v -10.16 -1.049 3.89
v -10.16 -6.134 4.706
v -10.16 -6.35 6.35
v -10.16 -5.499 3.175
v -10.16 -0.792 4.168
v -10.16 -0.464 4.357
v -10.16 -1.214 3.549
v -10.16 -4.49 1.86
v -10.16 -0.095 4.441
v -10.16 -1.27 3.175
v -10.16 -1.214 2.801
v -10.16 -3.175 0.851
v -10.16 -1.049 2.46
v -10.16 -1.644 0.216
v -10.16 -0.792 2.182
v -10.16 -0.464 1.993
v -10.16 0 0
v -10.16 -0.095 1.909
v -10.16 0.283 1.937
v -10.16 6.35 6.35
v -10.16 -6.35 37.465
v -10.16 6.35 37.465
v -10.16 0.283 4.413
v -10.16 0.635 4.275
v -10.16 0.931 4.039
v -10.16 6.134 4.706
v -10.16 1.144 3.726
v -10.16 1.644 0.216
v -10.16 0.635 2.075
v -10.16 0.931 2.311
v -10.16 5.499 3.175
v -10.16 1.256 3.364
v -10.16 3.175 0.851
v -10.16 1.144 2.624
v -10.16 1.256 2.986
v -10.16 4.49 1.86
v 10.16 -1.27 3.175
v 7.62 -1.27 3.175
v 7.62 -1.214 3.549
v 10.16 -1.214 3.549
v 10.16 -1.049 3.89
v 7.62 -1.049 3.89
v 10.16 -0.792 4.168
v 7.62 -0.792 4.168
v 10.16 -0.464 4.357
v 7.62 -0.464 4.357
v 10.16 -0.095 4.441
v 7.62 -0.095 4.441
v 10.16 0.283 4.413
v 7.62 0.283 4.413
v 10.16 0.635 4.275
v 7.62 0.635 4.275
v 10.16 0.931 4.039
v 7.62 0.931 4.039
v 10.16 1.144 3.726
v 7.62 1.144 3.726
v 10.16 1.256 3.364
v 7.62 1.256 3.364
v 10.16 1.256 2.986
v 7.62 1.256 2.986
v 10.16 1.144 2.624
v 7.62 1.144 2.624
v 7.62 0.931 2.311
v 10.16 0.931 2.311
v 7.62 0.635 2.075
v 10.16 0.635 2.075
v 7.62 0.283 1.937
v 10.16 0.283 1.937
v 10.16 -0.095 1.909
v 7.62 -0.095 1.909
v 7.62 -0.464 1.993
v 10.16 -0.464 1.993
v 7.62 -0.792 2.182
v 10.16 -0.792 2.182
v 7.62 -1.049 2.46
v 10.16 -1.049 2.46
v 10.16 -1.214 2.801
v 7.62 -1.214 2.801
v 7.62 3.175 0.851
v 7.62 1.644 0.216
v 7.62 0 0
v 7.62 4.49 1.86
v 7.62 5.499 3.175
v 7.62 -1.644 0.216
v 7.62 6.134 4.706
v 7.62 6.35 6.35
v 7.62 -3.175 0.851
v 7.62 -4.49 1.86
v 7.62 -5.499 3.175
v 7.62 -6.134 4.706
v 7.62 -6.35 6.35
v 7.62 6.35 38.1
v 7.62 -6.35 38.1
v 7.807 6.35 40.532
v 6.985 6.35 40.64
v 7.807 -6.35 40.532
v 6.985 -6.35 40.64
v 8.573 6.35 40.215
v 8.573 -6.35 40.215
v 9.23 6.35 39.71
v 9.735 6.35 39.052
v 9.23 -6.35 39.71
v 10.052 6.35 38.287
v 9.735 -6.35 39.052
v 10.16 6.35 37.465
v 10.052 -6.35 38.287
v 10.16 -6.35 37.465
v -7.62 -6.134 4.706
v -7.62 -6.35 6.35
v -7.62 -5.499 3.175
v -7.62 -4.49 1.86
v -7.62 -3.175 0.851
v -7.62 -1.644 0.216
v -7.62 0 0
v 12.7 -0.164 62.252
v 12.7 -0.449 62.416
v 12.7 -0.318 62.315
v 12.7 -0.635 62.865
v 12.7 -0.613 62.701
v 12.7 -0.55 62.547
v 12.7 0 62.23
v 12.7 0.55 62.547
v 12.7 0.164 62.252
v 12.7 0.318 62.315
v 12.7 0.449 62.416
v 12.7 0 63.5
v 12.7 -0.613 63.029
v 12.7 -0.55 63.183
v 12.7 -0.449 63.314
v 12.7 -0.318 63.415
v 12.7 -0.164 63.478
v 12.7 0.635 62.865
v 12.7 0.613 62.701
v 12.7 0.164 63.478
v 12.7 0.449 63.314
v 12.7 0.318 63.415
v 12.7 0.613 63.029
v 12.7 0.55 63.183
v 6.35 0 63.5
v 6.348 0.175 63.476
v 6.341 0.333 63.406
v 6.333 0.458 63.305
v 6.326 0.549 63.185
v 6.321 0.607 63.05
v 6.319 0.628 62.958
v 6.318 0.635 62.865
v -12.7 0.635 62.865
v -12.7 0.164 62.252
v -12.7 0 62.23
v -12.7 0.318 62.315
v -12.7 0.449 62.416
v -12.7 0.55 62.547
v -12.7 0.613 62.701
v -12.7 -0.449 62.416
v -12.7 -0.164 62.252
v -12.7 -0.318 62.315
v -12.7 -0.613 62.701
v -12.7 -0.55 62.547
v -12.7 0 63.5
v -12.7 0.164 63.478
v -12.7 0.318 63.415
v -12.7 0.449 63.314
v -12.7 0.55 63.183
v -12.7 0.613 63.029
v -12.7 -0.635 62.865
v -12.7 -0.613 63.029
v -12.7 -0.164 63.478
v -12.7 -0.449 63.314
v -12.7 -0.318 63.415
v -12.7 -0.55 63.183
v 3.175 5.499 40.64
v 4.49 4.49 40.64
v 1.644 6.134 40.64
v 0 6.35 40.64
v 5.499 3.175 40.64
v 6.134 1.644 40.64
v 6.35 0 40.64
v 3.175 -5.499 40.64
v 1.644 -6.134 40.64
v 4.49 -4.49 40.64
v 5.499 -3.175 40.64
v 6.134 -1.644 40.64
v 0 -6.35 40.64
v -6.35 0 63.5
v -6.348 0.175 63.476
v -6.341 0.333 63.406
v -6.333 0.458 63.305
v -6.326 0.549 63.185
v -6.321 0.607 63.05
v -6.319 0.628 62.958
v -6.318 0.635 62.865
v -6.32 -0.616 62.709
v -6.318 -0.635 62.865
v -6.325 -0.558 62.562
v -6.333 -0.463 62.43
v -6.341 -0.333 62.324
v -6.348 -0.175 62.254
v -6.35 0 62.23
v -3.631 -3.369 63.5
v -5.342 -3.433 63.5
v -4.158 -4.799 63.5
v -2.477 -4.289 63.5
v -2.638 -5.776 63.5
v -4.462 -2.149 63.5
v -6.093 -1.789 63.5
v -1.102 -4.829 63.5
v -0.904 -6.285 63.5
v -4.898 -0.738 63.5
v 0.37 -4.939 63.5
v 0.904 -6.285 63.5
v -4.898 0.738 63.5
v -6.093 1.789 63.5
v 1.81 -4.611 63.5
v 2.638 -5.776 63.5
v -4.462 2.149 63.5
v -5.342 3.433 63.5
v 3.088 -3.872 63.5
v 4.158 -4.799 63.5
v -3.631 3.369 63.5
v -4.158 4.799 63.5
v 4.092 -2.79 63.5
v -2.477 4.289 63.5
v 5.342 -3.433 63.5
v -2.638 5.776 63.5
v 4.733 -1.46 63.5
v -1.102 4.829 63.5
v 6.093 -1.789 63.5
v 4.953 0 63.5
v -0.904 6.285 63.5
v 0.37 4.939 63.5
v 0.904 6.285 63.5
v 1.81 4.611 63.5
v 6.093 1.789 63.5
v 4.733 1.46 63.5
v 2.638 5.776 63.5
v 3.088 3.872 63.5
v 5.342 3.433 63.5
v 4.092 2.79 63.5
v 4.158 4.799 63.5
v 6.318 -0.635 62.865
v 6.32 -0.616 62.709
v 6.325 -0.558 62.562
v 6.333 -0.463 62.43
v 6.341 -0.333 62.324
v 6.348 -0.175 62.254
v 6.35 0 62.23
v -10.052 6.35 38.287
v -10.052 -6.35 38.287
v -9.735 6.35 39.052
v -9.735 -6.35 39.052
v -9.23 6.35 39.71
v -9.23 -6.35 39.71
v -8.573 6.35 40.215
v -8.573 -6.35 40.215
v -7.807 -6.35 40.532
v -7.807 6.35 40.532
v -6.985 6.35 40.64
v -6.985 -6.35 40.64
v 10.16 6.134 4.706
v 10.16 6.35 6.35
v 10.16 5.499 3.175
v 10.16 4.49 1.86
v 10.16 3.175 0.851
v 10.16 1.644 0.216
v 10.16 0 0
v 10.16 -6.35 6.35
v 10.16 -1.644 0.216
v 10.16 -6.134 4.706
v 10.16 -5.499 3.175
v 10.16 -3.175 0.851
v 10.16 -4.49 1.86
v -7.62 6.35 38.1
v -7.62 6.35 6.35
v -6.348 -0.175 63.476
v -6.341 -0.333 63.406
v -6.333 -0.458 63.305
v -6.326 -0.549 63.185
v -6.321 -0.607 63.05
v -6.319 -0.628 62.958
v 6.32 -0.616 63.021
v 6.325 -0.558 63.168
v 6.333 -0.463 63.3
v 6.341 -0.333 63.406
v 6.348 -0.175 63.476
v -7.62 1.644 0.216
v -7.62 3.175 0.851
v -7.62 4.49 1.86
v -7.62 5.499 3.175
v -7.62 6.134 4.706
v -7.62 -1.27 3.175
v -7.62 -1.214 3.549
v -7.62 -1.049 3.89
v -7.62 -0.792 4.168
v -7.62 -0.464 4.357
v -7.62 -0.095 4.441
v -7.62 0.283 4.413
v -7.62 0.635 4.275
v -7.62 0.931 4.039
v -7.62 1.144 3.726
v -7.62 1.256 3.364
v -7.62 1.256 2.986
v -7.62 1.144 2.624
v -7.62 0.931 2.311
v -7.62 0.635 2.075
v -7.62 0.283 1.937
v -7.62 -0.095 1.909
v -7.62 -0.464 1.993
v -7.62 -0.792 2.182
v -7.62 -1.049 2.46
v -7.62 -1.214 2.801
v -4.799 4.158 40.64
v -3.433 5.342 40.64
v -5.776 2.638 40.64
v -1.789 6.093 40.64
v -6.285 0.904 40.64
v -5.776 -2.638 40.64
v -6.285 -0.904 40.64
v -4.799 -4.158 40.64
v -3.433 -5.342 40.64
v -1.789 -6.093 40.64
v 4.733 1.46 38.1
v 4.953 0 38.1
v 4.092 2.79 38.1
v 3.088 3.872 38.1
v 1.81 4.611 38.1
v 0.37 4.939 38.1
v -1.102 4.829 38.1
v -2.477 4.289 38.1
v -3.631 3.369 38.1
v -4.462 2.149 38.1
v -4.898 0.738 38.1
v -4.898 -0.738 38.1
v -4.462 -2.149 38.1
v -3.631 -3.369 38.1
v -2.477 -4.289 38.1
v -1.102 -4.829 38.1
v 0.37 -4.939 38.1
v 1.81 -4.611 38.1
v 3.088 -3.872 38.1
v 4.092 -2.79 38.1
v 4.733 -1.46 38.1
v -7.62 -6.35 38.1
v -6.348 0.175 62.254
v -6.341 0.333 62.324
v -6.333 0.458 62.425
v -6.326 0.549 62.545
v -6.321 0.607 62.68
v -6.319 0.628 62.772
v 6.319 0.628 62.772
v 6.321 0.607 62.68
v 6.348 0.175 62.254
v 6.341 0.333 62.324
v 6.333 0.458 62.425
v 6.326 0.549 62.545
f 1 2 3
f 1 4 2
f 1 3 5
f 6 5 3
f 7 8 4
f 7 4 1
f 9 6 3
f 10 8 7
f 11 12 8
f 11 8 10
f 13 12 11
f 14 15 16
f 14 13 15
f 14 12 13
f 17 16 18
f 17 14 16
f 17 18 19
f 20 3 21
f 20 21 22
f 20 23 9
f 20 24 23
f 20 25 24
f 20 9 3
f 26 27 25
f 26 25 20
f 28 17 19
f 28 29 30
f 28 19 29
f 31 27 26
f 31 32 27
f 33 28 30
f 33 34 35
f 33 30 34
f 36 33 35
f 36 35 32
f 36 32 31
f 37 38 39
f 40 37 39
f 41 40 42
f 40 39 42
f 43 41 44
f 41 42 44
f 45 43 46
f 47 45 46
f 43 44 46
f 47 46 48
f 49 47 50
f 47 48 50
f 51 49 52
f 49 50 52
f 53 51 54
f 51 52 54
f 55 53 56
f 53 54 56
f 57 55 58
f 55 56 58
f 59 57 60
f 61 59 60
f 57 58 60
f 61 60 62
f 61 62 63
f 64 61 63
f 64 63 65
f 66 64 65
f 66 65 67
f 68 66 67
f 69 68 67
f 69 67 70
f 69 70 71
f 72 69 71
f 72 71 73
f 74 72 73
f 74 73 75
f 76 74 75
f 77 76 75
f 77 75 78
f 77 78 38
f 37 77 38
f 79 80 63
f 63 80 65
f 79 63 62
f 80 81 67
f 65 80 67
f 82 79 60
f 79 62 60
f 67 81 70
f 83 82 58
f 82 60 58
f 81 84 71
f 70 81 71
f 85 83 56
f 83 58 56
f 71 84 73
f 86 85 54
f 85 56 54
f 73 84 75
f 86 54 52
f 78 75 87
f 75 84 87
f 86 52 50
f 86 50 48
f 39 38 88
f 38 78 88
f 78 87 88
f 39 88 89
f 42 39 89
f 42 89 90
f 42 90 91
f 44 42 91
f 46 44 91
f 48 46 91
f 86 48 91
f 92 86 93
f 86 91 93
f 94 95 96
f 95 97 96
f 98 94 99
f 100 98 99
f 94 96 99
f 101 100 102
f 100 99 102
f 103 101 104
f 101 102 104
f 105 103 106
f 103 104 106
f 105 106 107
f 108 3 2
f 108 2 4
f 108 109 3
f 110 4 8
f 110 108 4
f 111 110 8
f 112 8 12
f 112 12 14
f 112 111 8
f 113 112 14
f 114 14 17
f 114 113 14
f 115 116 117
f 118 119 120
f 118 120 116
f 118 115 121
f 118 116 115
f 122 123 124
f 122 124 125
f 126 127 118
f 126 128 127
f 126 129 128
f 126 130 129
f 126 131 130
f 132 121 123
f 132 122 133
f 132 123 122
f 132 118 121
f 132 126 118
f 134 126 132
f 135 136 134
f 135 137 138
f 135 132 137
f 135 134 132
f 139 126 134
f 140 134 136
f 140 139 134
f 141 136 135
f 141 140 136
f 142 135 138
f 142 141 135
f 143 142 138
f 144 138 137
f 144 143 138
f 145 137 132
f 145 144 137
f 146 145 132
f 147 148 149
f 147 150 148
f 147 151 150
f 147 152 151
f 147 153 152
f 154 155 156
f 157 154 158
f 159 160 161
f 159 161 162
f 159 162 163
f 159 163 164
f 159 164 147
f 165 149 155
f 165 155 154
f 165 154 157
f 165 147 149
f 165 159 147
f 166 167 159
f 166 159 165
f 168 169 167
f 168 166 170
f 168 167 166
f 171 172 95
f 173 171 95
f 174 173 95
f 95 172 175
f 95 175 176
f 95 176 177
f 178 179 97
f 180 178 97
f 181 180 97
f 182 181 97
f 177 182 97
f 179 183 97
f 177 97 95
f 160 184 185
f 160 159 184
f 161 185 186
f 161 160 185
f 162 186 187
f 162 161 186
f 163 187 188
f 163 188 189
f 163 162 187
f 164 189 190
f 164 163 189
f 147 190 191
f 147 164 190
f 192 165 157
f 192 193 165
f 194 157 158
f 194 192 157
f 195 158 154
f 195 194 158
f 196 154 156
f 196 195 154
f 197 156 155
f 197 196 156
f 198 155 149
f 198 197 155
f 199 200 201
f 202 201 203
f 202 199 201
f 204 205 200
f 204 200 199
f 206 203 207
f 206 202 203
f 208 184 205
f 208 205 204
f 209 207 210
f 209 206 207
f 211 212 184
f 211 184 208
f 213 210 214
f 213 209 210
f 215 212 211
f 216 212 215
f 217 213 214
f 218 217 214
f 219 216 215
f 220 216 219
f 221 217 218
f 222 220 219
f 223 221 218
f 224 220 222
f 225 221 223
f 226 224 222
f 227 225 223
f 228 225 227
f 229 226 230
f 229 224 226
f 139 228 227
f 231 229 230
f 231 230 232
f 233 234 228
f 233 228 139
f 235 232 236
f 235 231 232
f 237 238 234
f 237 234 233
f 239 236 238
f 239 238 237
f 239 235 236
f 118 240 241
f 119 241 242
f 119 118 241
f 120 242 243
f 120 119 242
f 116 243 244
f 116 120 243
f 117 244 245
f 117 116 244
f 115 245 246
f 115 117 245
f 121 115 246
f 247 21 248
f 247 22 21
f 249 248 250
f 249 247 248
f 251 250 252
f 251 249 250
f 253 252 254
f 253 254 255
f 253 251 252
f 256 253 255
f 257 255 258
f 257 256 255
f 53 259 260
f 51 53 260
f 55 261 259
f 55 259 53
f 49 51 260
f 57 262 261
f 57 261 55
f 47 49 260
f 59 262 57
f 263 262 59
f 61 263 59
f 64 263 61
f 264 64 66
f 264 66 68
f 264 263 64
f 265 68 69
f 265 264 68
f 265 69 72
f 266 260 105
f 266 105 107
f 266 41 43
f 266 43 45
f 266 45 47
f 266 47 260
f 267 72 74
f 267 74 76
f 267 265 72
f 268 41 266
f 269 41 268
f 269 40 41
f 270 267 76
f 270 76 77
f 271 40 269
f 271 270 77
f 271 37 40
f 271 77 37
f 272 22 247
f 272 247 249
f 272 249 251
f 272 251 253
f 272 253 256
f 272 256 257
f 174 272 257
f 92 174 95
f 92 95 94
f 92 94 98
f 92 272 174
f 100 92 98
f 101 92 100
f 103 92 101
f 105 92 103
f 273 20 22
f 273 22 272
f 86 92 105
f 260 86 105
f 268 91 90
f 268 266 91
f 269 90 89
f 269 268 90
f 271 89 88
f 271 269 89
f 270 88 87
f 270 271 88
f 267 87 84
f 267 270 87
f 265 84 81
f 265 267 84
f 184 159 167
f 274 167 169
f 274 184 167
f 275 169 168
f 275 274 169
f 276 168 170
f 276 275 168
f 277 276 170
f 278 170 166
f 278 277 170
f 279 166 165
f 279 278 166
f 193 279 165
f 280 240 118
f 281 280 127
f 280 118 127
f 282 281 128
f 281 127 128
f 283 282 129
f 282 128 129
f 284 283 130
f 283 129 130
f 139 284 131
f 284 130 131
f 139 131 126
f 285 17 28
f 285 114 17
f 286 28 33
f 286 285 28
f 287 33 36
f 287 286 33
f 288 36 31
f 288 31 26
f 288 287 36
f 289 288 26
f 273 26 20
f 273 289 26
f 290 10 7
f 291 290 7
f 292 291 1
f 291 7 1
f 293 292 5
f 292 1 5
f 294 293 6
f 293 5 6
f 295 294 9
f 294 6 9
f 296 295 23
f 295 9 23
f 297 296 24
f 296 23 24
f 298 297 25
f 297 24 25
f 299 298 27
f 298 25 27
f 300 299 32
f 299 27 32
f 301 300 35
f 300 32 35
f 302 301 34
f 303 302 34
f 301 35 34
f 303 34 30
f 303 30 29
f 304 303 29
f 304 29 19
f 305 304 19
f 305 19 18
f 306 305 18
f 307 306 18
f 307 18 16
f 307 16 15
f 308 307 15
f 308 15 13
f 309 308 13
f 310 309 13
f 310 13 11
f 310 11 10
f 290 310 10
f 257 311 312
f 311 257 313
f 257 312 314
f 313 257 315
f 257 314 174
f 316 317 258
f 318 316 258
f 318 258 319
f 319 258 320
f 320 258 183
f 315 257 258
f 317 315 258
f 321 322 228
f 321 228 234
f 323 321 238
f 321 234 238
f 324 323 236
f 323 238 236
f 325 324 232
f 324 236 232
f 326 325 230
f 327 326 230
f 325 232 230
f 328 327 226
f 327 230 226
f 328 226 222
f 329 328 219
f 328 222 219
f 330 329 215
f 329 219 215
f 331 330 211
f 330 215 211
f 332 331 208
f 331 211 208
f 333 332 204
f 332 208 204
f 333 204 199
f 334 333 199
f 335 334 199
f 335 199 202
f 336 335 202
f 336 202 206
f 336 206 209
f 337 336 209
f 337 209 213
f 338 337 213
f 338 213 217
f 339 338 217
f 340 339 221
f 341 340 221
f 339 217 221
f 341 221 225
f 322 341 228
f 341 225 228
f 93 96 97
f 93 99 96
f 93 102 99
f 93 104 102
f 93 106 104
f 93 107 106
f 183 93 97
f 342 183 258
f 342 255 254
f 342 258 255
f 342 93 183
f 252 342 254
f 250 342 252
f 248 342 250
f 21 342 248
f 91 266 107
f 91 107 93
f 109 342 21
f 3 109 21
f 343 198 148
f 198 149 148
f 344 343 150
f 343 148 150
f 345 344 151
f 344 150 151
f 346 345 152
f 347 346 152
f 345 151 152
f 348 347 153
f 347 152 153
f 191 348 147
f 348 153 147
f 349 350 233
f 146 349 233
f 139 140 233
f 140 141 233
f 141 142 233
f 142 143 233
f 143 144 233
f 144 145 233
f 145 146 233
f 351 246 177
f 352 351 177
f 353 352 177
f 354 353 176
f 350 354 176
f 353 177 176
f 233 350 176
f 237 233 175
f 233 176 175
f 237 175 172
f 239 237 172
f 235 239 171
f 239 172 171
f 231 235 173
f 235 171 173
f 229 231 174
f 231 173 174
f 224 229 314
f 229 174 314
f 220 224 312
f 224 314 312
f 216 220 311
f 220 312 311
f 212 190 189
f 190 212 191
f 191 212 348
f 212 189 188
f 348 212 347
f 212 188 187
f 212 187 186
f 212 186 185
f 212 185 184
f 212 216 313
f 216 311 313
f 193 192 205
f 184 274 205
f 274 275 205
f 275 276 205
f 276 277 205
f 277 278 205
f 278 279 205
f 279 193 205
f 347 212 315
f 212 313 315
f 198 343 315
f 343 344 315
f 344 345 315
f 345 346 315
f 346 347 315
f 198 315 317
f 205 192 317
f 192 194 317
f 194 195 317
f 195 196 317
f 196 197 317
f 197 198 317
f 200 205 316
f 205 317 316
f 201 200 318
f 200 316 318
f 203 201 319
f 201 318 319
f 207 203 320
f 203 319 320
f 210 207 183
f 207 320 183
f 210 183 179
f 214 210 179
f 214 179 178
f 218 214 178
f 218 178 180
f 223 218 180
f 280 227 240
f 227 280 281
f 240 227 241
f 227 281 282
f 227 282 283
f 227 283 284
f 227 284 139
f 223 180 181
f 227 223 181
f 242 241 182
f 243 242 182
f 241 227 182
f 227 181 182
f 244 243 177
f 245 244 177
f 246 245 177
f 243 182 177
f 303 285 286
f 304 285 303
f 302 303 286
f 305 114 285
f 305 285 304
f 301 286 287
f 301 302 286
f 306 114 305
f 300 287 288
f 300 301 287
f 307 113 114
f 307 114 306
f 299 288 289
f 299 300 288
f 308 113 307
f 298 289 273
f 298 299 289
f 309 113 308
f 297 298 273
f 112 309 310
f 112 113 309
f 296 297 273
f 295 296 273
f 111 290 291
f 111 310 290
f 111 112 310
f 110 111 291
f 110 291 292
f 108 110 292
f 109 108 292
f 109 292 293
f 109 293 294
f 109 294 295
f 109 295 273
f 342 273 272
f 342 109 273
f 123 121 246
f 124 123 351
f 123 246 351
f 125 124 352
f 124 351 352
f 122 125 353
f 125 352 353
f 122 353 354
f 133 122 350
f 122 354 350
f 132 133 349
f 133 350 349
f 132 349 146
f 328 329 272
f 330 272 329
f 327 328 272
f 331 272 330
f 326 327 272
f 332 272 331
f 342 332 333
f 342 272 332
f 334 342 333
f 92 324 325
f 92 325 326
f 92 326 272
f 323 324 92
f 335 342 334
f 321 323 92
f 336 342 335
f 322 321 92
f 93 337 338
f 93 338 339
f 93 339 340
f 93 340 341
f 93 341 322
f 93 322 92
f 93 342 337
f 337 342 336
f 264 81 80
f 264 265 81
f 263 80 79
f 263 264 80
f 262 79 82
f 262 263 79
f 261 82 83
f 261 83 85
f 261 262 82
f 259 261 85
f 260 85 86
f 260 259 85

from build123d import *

# Parameters (mm, degrees)
F0_R      = 6.35
F0_R_2    = 0.635
F1_DEPTH  = 63.5
F3_DEPTH  = 1.27
F4_R      = 0.6349
F5_R      = 0.635
F6_DEPTH  = 40.64
F7_R      = 1.27
F8_DEPTH  = 25.4
F9_W      = 15.24
F9_H      = 38.1
F10_DEPTH = 12.7
F11_R     = 4.953
F11_R_2   = 0.635
F12_DEPTH = 25.4
F13_R     = 6.34999
F14_R     = 3.175


# Not quite as in the source:
# - a fillet or chamfer is up to 0.001 mm smaller than in the source, because OpenCascade refuses the exact size


with BuildPart() as f1:
    # F0 (on Top) → F1 (new body)
    with BuildSketch(Plane.XY):
        Circle(F0_R)
        Circle(F0_R_2, mode=Mode.SUBTRACT)
    extrude(amount=F1_DEPTH)

    # F2 (on face) → F3 (join)
    with BuildSketch(Plane.XY.offset(63.5)):
        with BuildLine():
            Line((6.3181702256, -0.635), (12.7, -0.635))
            Line((12.7, -0.635), (12.7, 0.635))
            Line((12.7, 0.635), (6.3181702256, 0.635))
            ThreePointArc((6.3181702256, 0.635), (6.3420375643, 0.3178986216), (6.35, 0))
            ThreePointArc((6.35, 0), (6.3420375643, -0.3178986216), (6.3181702256, -0.635))
        make_face()
        with BuildLine():
            Line((-12.7, -0.635), (-6.3181702256, -0.635))
            ThreePointArc((-6.3181702256, -0.635), (-6.35, 0), (-6.3181702256, 0.635))
            Line((-6.3181702256, 0.635), (-12.7, 0.635))
            Line((-12.7, 0.635), (-12.7, -0.635))
        make_face()
    extrude(amount=-F3_DEPTH)

    # F4 (radius 0.635 in the source; OpenCascade refuses exactly that, so slightly less here)
    f4_edges = [f1.edges().sort_by_distance(p)[0] for p in [
        (9.509085, 0.635, 63.5),
        (9.509085, -0.635, 63.5),
        (-9.509085, 0.635, 63.5),
        (-9.509085, -0.635, 63.5),
        (9.509085, 0.635, 62.23),
        (9.509085, -0.635, 62.23),
        (-9.509085, -0.635, 62.23),
        (-9.509085, 0.635, 62.23),
    ]]
    fillet(f4_edges, radius=F4_R)

    # F5 (on face) → F6 (join)
    with BuildSketch(Plane(origin=(0, 0, 0), x_dir=(1, 0, 0), z_dir=(0, 0, -1))):
        with BuildLine():
            ThreePointArc((0, -6.35), (-6.35, 0), (0, 6.35))
            Line((0, 6.35), (-10.16, 6.35))
            Line((-10.16, 6.35), (-10.16, -6.35))
            Line((-10.16, -6.35), (0, -6.35))
        make_face()
        with BuildLine():
            Line((10.16, -6.35), (10.16, 6.35))
            Line((10.16, 6.35), (0, 6.35))
            ThreePointArc((0, 6.35), (4.4901280605, 4.4901280605), (6.35, 0))
            ThreePointArc((6.35, 0), (4.4901280605, -4.4901280605), (0, -6.35))
            Line((0, -6.35), (10.16, -6.35))
        make_face()
        Circle(F5_R)
    extrude(amount=-F6_DEPTH)

    # F7 (on face) → F8 (cut)
    with BuildSketch(Plane(origin=(-10.16, 0, 0), x_dir=(0, -1, 0), z_dir=(-1, 0, 0))):
        with Locations((0, 3.175)):
            Circle(F7_R)
    extrude(amount=-F8_DEPTH, mode=Mode.SUBTRACT)

    # F9 (on face) → F10 (cut)
    with BuildSketch(Plane.XZ.offset(6.35)):
        with Locations((0, 19.05)):
            Rectangle(F9_W, F9_H)
    extrude(amount=-F10_DEPTH, mode=Mode.SUBTRACT)

    # F11 (on face) → F12 (cut, through all)
    with BuildSketch(Plane.XY.offset(63.5)):
        Circle(F11_R)
        Circle(F11_R_2, mode=Mode.SUBTRACT)
        Circle(F11_R_2)
    extrude(amount=-F12_DEPTH, mode=Mode.SUBTRACT)

    # F13 (radius 6.35 in the source; OpenCascade refuses exactly that, so slightly less here)
    f13_edges = [f1.edges().sort_by_distance(p)[0] for p in [
        (8.89, 6.35, 0),
        (8.89, -6.35, 0),
        (-8.89, -6.35, 0),
        (-8.89, 6.35, 0),
    ]]
    fillet(f13_edges, radius=F13_R)

    # F14
    f14_edges = [f1.edges().sort_by_distance(p)[0] for p in [
        (10.16, 0, 40.64),
        (-10.16, 0, 40.64),
    ]]
    fillet(f14_edges, radius=F14_R)


solid = f1.part
